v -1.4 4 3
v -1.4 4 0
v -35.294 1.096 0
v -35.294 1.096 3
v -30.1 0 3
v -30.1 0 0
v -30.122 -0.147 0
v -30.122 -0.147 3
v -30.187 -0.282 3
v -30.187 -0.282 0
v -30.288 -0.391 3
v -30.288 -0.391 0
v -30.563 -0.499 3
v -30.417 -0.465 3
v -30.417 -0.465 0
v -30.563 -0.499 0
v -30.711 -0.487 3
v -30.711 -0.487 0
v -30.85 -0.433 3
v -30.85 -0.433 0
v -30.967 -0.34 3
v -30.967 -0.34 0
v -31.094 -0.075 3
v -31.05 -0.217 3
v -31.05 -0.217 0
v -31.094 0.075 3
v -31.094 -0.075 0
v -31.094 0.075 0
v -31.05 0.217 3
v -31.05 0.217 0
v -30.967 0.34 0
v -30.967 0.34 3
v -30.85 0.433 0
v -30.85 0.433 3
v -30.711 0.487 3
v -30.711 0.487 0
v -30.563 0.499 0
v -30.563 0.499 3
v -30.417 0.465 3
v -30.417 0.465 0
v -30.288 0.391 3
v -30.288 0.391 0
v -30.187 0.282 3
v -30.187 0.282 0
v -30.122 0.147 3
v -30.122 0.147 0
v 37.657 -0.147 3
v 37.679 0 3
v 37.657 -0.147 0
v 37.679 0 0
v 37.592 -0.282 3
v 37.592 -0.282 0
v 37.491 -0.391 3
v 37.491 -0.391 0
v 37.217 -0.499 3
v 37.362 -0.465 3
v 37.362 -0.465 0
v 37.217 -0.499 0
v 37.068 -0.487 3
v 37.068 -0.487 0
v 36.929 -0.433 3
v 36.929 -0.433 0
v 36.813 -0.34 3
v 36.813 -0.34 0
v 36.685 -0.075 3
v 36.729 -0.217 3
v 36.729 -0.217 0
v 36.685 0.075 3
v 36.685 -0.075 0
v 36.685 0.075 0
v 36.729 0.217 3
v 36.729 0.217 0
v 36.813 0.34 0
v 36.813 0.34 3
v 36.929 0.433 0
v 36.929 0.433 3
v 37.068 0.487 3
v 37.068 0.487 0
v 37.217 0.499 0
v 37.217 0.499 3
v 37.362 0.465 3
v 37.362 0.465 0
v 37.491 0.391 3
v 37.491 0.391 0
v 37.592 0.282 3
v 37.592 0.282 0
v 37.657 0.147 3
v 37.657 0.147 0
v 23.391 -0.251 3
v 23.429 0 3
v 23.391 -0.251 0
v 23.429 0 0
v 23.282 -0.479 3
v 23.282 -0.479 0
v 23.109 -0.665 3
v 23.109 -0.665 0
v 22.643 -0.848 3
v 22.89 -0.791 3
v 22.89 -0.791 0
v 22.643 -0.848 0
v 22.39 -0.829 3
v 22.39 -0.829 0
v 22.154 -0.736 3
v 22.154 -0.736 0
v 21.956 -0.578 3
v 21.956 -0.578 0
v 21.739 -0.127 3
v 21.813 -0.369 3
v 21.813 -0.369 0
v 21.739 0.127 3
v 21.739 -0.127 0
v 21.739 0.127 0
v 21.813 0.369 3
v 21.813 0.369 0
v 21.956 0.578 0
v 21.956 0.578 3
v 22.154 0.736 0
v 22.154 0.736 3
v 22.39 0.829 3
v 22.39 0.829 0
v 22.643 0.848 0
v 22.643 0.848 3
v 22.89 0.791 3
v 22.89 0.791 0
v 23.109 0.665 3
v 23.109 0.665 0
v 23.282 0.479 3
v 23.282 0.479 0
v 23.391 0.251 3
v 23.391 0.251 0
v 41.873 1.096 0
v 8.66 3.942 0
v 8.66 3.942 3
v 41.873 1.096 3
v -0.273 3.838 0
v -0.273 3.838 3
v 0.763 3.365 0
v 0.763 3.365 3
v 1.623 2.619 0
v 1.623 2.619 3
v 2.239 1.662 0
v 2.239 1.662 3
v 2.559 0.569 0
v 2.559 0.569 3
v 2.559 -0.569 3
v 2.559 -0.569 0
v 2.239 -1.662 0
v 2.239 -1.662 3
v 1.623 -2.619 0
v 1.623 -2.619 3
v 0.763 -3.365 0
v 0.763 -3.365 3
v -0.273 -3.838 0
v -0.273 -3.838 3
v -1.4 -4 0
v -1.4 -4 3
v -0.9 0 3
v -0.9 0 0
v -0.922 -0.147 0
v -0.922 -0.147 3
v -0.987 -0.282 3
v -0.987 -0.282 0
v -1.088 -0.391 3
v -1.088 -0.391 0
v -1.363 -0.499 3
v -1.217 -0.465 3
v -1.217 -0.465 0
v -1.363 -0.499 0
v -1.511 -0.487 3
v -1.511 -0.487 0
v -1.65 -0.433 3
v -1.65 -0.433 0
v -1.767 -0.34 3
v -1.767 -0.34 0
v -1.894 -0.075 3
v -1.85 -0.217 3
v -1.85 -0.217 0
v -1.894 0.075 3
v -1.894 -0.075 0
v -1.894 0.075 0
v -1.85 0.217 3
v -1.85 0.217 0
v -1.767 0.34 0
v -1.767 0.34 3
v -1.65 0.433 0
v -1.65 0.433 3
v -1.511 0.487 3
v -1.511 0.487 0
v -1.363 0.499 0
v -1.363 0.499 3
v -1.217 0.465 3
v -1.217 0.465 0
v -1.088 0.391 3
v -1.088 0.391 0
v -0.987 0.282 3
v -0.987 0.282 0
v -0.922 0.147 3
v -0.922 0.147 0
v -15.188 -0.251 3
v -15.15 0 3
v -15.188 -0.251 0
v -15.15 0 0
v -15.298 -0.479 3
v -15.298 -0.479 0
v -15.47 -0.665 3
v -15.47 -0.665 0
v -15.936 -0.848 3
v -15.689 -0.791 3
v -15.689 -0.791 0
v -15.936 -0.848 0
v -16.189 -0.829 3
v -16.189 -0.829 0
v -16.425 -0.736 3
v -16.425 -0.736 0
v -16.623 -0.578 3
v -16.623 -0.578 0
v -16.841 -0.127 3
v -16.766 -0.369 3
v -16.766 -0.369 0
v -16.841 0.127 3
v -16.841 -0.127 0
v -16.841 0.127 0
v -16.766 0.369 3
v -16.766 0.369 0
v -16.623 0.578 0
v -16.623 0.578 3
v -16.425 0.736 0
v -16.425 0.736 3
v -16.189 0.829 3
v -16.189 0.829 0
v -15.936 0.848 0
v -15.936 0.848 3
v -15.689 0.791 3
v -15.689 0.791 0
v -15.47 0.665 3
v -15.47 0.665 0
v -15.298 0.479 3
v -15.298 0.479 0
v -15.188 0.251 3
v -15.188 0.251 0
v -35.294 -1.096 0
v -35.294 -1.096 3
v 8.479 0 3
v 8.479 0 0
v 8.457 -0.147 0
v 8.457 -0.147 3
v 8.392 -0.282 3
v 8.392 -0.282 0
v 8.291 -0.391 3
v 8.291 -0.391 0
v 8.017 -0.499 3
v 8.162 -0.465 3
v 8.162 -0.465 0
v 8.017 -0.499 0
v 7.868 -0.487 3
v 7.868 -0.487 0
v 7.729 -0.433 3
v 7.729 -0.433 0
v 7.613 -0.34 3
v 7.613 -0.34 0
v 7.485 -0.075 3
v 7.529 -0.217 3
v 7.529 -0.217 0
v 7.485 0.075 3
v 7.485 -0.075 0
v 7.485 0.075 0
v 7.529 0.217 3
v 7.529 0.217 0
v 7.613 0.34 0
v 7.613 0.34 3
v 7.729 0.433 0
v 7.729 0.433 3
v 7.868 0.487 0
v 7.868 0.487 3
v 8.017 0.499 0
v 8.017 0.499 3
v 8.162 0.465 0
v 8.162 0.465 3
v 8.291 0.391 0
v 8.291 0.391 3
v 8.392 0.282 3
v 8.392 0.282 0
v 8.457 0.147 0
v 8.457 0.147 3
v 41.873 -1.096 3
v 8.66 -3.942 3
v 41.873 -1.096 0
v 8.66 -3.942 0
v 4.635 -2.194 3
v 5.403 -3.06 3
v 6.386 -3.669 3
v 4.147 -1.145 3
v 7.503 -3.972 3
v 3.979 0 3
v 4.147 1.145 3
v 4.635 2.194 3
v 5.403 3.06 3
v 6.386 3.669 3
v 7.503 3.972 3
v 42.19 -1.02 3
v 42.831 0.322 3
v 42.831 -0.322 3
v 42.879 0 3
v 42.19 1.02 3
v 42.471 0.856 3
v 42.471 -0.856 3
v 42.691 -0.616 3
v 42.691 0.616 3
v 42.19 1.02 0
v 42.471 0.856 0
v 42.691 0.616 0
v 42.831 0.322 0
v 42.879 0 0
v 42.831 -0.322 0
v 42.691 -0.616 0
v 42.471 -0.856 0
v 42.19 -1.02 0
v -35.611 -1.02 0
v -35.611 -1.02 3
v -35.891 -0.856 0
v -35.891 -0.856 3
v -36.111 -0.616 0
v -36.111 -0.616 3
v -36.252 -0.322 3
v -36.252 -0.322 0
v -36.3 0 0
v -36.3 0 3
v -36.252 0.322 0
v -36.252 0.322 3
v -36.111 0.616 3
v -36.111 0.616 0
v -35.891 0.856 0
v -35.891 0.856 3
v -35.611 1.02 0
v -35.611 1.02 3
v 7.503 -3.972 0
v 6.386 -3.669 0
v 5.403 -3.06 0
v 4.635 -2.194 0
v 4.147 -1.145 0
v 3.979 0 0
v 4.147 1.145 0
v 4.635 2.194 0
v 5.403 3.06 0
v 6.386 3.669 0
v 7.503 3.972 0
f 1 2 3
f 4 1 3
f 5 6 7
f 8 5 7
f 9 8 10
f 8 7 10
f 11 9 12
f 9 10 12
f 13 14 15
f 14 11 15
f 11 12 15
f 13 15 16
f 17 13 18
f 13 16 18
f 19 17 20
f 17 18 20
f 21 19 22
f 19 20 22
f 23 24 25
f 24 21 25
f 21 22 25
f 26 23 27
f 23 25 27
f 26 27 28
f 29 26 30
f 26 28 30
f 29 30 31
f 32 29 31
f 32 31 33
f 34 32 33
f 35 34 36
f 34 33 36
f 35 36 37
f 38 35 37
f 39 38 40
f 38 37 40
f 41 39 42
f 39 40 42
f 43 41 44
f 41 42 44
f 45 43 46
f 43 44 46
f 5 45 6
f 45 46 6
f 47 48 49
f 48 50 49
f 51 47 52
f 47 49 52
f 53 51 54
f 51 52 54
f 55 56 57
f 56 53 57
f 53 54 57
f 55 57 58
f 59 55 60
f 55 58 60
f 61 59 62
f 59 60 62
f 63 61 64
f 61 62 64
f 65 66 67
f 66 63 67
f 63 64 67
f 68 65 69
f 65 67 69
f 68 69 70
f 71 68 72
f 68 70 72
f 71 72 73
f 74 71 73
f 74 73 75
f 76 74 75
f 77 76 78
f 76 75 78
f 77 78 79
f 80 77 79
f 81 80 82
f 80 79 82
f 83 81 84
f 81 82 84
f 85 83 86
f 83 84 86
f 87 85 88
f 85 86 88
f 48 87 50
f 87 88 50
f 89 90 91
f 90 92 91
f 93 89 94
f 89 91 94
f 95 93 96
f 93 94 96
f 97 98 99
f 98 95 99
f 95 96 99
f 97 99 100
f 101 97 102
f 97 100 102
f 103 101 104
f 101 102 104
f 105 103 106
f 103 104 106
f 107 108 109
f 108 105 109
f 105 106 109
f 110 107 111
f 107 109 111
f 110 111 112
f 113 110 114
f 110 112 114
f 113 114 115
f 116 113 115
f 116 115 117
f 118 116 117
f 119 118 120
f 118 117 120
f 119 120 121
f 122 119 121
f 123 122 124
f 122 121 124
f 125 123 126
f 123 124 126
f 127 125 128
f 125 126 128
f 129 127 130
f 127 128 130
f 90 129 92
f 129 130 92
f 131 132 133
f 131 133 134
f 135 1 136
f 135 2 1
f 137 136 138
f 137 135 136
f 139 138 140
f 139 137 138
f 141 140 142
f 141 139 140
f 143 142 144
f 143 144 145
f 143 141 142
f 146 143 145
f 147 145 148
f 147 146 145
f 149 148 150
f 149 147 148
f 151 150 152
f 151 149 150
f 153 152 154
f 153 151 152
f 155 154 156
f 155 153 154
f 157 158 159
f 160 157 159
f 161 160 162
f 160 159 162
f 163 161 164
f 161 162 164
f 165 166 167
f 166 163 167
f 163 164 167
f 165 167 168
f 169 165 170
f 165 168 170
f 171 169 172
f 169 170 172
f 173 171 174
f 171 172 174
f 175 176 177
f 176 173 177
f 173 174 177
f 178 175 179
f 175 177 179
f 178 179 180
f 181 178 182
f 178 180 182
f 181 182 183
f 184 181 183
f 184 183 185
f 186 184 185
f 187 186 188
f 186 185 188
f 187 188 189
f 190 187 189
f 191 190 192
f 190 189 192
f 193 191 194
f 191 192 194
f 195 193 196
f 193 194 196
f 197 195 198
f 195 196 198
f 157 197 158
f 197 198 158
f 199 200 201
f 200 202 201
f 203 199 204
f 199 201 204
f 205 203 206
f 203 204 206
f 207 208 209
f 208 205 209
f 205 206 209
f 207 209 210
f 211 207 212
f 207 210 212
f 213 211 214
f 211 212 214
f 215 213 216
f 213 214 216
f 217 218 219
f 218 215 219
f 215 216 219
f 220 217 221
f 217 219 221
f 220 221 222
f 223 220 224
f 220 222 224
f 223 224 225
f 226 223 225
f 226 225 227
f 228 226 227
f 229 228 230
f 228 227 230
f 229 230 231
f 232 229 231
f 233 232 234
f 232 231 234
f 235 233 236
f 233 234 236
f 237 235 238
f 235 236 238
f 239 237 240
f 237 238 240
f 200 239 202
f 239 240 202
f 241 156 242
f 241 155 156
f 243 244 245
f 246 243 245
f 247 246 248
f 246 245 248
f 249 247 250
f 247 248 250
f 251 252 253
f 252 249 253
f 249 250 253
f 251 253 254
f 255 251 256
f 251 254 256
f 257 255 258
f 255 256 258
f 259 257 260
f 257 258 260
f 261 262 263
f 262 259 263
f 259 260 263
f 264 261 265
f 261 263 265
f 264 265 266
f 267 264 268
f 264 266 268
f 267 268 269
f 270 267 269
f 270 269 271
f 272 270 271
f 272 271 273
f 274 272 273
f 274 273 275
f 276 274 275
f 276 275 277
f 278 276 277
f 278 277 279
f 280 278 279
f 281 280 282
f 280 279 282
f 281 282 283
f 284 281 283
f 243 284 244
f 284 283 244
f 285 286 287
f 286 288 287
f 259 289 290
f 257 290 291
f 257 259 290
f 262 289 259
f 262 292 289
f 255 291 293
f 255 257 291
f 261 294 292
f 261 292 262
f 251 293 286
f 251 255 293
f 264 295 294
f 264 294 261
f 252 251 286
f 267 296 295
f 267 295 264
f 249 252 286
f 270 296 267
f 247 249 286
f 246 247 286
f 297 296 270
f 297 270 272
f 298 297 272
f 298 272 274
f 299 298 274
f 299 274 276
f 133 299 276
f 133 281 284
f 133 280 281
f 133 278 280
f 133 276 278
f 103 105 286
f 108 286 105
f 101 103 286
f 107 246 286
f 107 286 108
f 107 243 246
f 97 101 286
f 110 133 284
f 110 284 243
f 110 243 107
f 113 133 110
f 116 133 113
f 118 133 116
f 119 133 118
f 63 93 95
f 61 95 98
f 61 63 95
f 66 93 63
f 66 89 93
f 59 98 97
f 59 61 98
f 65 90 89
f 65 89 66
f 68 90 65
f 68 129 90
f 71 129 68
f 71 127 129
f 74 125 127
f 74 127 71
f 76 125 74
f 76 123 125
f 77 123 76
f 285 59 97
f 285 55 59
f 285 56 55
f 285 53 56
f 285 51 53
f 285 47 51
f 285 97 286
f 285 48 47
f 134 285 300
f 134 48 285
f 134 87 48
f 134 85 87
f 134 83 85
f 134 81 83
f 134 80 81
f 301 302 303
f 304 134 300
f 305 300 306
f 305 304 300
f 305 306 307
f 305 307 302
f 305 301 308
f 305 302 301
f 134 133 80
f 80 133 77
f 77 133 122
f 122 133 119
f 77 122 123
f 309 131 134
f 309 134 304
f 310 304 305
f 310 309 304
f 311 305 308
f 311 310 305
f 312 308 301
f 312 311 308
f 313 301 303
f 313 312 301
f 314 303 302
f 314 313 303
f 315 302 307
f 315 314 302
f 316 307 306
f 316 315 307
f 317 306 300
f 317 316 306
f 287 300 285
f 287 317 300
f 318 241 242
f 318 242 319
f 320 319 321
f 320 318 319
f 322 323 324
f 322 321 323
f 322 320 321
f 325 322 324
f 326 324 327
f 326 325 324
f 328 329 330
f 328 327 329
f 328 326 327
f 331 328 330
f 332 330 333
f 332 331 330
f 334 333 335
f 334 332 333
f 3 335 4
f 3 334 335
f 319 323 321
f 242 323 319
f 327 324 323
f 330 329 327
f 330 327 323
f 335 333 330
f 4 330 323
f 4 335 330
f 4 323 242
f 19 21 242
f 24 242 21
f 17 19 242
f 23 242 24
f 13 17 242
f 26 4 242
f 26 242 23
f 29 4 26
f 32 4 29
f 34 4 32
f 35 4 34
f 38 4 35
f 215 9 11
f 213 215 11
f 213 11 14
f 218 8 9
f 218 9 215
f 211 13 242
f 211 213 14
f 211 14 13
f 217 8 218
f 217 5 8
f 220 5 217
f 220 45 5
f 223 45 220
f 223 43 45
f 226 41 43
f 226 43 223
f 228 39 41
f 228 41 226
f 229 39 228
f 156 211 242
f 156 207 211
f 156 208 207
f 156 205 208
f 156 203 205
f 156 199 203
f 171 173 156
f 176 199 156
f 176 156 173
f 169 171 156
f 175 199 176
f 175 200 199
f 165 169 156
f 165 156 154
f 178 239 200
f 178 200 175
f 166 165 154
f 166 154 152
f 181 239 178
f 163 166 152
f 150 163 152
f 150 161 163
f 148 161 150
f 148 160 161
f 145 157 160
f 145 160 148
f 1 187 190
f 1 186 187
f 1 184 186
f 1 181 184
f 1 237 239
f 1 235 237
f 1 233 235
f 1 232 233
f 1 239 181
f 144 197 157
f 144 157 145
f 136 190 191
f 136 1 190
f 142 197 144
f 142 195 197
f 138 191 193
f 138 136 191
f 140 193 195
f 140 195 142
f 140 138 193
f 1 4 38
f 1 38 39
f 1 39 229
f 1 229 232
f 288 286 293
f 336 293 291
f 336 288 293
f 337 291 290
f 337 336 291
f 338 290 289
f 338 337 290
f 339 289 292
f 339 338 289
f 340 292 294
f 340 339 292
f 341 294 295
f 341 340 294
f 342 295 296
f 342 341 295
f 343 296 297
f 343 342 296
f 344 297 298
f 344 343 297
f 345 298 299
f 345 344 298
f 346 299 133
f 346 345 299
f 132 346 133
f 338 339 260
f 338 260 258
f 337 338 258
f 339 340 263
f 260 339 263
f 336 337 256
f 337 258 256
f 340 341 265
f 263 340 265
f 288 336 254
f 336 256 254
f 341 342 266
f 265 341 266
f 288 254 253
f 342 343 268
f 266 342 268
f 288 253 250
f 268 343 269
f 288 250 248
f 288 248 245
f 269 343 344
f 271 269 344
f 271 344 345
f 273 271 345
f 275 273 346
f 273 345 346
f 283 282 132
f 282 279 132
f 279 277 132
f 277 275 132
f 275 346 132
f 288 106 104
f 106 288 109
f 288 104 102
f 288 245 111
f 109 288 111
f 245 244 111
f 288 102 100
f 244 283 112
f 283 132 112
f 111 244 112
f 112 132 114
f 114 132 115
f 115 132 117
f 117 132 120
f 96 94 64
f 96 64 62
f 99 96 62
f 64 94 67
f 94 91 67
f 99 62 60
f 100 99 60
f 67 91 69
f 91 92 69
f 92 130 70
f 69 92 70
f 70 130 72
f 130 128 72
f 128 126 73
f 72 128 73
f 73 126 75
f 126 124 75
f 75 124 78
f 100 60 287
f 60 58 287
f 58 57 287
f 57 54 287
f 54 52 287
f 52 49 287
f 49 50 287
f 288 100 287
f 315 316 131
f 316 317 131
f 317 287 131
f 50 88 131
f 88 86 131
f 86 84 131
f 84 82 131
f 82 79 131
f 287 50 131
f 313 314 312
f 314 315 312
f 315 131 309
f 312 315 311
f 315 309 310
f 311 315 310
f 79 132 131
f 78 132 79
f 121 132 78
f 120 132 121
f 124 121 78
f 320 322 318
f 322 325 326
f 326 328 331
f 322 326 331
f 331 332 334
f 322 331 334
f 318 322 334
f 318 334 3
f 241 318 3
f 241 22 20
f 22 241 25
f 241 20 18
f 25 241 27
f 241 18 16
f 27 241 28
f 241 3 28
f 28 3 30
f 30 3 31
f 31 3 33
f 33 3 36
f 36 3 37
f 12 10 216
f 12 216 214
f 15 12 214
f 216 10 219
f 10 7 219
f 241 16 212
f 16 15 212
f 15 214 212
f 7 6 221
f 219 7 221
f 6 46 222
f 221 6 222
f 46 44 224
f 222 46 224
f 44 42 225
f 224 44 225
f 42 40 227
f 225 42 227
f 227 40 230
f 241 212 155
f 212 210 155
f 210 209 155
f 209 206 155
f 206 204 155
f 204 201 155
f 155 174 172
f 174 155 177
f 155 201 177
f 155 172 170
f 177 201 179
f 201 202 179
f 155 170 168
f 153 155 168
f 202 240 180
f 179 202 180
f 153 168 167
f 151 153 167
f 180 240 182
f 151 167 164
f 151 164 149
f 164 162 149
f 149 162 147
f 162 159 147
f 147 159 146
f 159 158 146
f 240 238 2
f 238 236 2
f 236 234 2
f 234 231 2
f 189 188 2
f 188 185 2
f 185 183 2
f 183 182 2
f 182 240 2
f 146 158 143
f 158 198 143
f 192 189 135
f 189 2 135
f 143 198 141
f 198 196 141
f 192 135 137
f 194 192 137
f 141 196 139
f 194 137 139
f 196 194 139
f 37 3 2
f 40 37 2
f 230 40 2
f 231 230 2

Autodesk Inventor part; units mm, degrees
ref_plane "YZ Plane" through (0, 0, 0) normal (1, 0, 0) x (0, 1, 0)
ref_plane "XZ Plane" through (0, 0, 0) normal (0, 1, 0) x (-1, 0, 0)
ref_plane "XY Plane" through (0, 0, 0) normal (0, 0, 1) x (1, 0, 0)
sketch "Sketch1" plane through (0, 0, 0) normal (0, 0, 1) x (1, 0, 0)
  circle A0 centre (-30.6, 0) radius 0.5
  circle A1 centre (-1.4, 0) radius 0.5
  circle A2 centre (22.5792, 0) radius 0.85
  circle A3 centre (7.9792, 0) radius 0.5
  circle A4 centre (37.1792, 0) radius 0.5
  circle A5 centre (-1.4, 0) radius 4
  circle A6 centre (7.9792, 0) radius 4
  circle A7 centre (-35.2, 0) radius 1.1
  circle A8 centre (41.7792, 0) radius 1.1
  line L0 (-1.4, 4) -> (-35.2939, 1.096)
  line L1 (-1.4, -4) -> (-35.2939, -1.096)
  line L2 (7.9792, 4) -> (41.8731, 1.096)
  line L3 (7.9792, -4) -> (41.8731, -1.096)
  circle A9 centre (-16, 0) radius 0.85
  dimension "d0" = 8
  dimension "d1" = 8
extrude "Extrusion1" add sketch "Sketch1" along normal blind 3 contours A5 L1 L0 | A5 L1 A7 L0 | A7 | L2 A6 L3 | A6 L2 | L3 A6 | L2 A8 L3 A6 | A8
properties part number "Eyebrows"
